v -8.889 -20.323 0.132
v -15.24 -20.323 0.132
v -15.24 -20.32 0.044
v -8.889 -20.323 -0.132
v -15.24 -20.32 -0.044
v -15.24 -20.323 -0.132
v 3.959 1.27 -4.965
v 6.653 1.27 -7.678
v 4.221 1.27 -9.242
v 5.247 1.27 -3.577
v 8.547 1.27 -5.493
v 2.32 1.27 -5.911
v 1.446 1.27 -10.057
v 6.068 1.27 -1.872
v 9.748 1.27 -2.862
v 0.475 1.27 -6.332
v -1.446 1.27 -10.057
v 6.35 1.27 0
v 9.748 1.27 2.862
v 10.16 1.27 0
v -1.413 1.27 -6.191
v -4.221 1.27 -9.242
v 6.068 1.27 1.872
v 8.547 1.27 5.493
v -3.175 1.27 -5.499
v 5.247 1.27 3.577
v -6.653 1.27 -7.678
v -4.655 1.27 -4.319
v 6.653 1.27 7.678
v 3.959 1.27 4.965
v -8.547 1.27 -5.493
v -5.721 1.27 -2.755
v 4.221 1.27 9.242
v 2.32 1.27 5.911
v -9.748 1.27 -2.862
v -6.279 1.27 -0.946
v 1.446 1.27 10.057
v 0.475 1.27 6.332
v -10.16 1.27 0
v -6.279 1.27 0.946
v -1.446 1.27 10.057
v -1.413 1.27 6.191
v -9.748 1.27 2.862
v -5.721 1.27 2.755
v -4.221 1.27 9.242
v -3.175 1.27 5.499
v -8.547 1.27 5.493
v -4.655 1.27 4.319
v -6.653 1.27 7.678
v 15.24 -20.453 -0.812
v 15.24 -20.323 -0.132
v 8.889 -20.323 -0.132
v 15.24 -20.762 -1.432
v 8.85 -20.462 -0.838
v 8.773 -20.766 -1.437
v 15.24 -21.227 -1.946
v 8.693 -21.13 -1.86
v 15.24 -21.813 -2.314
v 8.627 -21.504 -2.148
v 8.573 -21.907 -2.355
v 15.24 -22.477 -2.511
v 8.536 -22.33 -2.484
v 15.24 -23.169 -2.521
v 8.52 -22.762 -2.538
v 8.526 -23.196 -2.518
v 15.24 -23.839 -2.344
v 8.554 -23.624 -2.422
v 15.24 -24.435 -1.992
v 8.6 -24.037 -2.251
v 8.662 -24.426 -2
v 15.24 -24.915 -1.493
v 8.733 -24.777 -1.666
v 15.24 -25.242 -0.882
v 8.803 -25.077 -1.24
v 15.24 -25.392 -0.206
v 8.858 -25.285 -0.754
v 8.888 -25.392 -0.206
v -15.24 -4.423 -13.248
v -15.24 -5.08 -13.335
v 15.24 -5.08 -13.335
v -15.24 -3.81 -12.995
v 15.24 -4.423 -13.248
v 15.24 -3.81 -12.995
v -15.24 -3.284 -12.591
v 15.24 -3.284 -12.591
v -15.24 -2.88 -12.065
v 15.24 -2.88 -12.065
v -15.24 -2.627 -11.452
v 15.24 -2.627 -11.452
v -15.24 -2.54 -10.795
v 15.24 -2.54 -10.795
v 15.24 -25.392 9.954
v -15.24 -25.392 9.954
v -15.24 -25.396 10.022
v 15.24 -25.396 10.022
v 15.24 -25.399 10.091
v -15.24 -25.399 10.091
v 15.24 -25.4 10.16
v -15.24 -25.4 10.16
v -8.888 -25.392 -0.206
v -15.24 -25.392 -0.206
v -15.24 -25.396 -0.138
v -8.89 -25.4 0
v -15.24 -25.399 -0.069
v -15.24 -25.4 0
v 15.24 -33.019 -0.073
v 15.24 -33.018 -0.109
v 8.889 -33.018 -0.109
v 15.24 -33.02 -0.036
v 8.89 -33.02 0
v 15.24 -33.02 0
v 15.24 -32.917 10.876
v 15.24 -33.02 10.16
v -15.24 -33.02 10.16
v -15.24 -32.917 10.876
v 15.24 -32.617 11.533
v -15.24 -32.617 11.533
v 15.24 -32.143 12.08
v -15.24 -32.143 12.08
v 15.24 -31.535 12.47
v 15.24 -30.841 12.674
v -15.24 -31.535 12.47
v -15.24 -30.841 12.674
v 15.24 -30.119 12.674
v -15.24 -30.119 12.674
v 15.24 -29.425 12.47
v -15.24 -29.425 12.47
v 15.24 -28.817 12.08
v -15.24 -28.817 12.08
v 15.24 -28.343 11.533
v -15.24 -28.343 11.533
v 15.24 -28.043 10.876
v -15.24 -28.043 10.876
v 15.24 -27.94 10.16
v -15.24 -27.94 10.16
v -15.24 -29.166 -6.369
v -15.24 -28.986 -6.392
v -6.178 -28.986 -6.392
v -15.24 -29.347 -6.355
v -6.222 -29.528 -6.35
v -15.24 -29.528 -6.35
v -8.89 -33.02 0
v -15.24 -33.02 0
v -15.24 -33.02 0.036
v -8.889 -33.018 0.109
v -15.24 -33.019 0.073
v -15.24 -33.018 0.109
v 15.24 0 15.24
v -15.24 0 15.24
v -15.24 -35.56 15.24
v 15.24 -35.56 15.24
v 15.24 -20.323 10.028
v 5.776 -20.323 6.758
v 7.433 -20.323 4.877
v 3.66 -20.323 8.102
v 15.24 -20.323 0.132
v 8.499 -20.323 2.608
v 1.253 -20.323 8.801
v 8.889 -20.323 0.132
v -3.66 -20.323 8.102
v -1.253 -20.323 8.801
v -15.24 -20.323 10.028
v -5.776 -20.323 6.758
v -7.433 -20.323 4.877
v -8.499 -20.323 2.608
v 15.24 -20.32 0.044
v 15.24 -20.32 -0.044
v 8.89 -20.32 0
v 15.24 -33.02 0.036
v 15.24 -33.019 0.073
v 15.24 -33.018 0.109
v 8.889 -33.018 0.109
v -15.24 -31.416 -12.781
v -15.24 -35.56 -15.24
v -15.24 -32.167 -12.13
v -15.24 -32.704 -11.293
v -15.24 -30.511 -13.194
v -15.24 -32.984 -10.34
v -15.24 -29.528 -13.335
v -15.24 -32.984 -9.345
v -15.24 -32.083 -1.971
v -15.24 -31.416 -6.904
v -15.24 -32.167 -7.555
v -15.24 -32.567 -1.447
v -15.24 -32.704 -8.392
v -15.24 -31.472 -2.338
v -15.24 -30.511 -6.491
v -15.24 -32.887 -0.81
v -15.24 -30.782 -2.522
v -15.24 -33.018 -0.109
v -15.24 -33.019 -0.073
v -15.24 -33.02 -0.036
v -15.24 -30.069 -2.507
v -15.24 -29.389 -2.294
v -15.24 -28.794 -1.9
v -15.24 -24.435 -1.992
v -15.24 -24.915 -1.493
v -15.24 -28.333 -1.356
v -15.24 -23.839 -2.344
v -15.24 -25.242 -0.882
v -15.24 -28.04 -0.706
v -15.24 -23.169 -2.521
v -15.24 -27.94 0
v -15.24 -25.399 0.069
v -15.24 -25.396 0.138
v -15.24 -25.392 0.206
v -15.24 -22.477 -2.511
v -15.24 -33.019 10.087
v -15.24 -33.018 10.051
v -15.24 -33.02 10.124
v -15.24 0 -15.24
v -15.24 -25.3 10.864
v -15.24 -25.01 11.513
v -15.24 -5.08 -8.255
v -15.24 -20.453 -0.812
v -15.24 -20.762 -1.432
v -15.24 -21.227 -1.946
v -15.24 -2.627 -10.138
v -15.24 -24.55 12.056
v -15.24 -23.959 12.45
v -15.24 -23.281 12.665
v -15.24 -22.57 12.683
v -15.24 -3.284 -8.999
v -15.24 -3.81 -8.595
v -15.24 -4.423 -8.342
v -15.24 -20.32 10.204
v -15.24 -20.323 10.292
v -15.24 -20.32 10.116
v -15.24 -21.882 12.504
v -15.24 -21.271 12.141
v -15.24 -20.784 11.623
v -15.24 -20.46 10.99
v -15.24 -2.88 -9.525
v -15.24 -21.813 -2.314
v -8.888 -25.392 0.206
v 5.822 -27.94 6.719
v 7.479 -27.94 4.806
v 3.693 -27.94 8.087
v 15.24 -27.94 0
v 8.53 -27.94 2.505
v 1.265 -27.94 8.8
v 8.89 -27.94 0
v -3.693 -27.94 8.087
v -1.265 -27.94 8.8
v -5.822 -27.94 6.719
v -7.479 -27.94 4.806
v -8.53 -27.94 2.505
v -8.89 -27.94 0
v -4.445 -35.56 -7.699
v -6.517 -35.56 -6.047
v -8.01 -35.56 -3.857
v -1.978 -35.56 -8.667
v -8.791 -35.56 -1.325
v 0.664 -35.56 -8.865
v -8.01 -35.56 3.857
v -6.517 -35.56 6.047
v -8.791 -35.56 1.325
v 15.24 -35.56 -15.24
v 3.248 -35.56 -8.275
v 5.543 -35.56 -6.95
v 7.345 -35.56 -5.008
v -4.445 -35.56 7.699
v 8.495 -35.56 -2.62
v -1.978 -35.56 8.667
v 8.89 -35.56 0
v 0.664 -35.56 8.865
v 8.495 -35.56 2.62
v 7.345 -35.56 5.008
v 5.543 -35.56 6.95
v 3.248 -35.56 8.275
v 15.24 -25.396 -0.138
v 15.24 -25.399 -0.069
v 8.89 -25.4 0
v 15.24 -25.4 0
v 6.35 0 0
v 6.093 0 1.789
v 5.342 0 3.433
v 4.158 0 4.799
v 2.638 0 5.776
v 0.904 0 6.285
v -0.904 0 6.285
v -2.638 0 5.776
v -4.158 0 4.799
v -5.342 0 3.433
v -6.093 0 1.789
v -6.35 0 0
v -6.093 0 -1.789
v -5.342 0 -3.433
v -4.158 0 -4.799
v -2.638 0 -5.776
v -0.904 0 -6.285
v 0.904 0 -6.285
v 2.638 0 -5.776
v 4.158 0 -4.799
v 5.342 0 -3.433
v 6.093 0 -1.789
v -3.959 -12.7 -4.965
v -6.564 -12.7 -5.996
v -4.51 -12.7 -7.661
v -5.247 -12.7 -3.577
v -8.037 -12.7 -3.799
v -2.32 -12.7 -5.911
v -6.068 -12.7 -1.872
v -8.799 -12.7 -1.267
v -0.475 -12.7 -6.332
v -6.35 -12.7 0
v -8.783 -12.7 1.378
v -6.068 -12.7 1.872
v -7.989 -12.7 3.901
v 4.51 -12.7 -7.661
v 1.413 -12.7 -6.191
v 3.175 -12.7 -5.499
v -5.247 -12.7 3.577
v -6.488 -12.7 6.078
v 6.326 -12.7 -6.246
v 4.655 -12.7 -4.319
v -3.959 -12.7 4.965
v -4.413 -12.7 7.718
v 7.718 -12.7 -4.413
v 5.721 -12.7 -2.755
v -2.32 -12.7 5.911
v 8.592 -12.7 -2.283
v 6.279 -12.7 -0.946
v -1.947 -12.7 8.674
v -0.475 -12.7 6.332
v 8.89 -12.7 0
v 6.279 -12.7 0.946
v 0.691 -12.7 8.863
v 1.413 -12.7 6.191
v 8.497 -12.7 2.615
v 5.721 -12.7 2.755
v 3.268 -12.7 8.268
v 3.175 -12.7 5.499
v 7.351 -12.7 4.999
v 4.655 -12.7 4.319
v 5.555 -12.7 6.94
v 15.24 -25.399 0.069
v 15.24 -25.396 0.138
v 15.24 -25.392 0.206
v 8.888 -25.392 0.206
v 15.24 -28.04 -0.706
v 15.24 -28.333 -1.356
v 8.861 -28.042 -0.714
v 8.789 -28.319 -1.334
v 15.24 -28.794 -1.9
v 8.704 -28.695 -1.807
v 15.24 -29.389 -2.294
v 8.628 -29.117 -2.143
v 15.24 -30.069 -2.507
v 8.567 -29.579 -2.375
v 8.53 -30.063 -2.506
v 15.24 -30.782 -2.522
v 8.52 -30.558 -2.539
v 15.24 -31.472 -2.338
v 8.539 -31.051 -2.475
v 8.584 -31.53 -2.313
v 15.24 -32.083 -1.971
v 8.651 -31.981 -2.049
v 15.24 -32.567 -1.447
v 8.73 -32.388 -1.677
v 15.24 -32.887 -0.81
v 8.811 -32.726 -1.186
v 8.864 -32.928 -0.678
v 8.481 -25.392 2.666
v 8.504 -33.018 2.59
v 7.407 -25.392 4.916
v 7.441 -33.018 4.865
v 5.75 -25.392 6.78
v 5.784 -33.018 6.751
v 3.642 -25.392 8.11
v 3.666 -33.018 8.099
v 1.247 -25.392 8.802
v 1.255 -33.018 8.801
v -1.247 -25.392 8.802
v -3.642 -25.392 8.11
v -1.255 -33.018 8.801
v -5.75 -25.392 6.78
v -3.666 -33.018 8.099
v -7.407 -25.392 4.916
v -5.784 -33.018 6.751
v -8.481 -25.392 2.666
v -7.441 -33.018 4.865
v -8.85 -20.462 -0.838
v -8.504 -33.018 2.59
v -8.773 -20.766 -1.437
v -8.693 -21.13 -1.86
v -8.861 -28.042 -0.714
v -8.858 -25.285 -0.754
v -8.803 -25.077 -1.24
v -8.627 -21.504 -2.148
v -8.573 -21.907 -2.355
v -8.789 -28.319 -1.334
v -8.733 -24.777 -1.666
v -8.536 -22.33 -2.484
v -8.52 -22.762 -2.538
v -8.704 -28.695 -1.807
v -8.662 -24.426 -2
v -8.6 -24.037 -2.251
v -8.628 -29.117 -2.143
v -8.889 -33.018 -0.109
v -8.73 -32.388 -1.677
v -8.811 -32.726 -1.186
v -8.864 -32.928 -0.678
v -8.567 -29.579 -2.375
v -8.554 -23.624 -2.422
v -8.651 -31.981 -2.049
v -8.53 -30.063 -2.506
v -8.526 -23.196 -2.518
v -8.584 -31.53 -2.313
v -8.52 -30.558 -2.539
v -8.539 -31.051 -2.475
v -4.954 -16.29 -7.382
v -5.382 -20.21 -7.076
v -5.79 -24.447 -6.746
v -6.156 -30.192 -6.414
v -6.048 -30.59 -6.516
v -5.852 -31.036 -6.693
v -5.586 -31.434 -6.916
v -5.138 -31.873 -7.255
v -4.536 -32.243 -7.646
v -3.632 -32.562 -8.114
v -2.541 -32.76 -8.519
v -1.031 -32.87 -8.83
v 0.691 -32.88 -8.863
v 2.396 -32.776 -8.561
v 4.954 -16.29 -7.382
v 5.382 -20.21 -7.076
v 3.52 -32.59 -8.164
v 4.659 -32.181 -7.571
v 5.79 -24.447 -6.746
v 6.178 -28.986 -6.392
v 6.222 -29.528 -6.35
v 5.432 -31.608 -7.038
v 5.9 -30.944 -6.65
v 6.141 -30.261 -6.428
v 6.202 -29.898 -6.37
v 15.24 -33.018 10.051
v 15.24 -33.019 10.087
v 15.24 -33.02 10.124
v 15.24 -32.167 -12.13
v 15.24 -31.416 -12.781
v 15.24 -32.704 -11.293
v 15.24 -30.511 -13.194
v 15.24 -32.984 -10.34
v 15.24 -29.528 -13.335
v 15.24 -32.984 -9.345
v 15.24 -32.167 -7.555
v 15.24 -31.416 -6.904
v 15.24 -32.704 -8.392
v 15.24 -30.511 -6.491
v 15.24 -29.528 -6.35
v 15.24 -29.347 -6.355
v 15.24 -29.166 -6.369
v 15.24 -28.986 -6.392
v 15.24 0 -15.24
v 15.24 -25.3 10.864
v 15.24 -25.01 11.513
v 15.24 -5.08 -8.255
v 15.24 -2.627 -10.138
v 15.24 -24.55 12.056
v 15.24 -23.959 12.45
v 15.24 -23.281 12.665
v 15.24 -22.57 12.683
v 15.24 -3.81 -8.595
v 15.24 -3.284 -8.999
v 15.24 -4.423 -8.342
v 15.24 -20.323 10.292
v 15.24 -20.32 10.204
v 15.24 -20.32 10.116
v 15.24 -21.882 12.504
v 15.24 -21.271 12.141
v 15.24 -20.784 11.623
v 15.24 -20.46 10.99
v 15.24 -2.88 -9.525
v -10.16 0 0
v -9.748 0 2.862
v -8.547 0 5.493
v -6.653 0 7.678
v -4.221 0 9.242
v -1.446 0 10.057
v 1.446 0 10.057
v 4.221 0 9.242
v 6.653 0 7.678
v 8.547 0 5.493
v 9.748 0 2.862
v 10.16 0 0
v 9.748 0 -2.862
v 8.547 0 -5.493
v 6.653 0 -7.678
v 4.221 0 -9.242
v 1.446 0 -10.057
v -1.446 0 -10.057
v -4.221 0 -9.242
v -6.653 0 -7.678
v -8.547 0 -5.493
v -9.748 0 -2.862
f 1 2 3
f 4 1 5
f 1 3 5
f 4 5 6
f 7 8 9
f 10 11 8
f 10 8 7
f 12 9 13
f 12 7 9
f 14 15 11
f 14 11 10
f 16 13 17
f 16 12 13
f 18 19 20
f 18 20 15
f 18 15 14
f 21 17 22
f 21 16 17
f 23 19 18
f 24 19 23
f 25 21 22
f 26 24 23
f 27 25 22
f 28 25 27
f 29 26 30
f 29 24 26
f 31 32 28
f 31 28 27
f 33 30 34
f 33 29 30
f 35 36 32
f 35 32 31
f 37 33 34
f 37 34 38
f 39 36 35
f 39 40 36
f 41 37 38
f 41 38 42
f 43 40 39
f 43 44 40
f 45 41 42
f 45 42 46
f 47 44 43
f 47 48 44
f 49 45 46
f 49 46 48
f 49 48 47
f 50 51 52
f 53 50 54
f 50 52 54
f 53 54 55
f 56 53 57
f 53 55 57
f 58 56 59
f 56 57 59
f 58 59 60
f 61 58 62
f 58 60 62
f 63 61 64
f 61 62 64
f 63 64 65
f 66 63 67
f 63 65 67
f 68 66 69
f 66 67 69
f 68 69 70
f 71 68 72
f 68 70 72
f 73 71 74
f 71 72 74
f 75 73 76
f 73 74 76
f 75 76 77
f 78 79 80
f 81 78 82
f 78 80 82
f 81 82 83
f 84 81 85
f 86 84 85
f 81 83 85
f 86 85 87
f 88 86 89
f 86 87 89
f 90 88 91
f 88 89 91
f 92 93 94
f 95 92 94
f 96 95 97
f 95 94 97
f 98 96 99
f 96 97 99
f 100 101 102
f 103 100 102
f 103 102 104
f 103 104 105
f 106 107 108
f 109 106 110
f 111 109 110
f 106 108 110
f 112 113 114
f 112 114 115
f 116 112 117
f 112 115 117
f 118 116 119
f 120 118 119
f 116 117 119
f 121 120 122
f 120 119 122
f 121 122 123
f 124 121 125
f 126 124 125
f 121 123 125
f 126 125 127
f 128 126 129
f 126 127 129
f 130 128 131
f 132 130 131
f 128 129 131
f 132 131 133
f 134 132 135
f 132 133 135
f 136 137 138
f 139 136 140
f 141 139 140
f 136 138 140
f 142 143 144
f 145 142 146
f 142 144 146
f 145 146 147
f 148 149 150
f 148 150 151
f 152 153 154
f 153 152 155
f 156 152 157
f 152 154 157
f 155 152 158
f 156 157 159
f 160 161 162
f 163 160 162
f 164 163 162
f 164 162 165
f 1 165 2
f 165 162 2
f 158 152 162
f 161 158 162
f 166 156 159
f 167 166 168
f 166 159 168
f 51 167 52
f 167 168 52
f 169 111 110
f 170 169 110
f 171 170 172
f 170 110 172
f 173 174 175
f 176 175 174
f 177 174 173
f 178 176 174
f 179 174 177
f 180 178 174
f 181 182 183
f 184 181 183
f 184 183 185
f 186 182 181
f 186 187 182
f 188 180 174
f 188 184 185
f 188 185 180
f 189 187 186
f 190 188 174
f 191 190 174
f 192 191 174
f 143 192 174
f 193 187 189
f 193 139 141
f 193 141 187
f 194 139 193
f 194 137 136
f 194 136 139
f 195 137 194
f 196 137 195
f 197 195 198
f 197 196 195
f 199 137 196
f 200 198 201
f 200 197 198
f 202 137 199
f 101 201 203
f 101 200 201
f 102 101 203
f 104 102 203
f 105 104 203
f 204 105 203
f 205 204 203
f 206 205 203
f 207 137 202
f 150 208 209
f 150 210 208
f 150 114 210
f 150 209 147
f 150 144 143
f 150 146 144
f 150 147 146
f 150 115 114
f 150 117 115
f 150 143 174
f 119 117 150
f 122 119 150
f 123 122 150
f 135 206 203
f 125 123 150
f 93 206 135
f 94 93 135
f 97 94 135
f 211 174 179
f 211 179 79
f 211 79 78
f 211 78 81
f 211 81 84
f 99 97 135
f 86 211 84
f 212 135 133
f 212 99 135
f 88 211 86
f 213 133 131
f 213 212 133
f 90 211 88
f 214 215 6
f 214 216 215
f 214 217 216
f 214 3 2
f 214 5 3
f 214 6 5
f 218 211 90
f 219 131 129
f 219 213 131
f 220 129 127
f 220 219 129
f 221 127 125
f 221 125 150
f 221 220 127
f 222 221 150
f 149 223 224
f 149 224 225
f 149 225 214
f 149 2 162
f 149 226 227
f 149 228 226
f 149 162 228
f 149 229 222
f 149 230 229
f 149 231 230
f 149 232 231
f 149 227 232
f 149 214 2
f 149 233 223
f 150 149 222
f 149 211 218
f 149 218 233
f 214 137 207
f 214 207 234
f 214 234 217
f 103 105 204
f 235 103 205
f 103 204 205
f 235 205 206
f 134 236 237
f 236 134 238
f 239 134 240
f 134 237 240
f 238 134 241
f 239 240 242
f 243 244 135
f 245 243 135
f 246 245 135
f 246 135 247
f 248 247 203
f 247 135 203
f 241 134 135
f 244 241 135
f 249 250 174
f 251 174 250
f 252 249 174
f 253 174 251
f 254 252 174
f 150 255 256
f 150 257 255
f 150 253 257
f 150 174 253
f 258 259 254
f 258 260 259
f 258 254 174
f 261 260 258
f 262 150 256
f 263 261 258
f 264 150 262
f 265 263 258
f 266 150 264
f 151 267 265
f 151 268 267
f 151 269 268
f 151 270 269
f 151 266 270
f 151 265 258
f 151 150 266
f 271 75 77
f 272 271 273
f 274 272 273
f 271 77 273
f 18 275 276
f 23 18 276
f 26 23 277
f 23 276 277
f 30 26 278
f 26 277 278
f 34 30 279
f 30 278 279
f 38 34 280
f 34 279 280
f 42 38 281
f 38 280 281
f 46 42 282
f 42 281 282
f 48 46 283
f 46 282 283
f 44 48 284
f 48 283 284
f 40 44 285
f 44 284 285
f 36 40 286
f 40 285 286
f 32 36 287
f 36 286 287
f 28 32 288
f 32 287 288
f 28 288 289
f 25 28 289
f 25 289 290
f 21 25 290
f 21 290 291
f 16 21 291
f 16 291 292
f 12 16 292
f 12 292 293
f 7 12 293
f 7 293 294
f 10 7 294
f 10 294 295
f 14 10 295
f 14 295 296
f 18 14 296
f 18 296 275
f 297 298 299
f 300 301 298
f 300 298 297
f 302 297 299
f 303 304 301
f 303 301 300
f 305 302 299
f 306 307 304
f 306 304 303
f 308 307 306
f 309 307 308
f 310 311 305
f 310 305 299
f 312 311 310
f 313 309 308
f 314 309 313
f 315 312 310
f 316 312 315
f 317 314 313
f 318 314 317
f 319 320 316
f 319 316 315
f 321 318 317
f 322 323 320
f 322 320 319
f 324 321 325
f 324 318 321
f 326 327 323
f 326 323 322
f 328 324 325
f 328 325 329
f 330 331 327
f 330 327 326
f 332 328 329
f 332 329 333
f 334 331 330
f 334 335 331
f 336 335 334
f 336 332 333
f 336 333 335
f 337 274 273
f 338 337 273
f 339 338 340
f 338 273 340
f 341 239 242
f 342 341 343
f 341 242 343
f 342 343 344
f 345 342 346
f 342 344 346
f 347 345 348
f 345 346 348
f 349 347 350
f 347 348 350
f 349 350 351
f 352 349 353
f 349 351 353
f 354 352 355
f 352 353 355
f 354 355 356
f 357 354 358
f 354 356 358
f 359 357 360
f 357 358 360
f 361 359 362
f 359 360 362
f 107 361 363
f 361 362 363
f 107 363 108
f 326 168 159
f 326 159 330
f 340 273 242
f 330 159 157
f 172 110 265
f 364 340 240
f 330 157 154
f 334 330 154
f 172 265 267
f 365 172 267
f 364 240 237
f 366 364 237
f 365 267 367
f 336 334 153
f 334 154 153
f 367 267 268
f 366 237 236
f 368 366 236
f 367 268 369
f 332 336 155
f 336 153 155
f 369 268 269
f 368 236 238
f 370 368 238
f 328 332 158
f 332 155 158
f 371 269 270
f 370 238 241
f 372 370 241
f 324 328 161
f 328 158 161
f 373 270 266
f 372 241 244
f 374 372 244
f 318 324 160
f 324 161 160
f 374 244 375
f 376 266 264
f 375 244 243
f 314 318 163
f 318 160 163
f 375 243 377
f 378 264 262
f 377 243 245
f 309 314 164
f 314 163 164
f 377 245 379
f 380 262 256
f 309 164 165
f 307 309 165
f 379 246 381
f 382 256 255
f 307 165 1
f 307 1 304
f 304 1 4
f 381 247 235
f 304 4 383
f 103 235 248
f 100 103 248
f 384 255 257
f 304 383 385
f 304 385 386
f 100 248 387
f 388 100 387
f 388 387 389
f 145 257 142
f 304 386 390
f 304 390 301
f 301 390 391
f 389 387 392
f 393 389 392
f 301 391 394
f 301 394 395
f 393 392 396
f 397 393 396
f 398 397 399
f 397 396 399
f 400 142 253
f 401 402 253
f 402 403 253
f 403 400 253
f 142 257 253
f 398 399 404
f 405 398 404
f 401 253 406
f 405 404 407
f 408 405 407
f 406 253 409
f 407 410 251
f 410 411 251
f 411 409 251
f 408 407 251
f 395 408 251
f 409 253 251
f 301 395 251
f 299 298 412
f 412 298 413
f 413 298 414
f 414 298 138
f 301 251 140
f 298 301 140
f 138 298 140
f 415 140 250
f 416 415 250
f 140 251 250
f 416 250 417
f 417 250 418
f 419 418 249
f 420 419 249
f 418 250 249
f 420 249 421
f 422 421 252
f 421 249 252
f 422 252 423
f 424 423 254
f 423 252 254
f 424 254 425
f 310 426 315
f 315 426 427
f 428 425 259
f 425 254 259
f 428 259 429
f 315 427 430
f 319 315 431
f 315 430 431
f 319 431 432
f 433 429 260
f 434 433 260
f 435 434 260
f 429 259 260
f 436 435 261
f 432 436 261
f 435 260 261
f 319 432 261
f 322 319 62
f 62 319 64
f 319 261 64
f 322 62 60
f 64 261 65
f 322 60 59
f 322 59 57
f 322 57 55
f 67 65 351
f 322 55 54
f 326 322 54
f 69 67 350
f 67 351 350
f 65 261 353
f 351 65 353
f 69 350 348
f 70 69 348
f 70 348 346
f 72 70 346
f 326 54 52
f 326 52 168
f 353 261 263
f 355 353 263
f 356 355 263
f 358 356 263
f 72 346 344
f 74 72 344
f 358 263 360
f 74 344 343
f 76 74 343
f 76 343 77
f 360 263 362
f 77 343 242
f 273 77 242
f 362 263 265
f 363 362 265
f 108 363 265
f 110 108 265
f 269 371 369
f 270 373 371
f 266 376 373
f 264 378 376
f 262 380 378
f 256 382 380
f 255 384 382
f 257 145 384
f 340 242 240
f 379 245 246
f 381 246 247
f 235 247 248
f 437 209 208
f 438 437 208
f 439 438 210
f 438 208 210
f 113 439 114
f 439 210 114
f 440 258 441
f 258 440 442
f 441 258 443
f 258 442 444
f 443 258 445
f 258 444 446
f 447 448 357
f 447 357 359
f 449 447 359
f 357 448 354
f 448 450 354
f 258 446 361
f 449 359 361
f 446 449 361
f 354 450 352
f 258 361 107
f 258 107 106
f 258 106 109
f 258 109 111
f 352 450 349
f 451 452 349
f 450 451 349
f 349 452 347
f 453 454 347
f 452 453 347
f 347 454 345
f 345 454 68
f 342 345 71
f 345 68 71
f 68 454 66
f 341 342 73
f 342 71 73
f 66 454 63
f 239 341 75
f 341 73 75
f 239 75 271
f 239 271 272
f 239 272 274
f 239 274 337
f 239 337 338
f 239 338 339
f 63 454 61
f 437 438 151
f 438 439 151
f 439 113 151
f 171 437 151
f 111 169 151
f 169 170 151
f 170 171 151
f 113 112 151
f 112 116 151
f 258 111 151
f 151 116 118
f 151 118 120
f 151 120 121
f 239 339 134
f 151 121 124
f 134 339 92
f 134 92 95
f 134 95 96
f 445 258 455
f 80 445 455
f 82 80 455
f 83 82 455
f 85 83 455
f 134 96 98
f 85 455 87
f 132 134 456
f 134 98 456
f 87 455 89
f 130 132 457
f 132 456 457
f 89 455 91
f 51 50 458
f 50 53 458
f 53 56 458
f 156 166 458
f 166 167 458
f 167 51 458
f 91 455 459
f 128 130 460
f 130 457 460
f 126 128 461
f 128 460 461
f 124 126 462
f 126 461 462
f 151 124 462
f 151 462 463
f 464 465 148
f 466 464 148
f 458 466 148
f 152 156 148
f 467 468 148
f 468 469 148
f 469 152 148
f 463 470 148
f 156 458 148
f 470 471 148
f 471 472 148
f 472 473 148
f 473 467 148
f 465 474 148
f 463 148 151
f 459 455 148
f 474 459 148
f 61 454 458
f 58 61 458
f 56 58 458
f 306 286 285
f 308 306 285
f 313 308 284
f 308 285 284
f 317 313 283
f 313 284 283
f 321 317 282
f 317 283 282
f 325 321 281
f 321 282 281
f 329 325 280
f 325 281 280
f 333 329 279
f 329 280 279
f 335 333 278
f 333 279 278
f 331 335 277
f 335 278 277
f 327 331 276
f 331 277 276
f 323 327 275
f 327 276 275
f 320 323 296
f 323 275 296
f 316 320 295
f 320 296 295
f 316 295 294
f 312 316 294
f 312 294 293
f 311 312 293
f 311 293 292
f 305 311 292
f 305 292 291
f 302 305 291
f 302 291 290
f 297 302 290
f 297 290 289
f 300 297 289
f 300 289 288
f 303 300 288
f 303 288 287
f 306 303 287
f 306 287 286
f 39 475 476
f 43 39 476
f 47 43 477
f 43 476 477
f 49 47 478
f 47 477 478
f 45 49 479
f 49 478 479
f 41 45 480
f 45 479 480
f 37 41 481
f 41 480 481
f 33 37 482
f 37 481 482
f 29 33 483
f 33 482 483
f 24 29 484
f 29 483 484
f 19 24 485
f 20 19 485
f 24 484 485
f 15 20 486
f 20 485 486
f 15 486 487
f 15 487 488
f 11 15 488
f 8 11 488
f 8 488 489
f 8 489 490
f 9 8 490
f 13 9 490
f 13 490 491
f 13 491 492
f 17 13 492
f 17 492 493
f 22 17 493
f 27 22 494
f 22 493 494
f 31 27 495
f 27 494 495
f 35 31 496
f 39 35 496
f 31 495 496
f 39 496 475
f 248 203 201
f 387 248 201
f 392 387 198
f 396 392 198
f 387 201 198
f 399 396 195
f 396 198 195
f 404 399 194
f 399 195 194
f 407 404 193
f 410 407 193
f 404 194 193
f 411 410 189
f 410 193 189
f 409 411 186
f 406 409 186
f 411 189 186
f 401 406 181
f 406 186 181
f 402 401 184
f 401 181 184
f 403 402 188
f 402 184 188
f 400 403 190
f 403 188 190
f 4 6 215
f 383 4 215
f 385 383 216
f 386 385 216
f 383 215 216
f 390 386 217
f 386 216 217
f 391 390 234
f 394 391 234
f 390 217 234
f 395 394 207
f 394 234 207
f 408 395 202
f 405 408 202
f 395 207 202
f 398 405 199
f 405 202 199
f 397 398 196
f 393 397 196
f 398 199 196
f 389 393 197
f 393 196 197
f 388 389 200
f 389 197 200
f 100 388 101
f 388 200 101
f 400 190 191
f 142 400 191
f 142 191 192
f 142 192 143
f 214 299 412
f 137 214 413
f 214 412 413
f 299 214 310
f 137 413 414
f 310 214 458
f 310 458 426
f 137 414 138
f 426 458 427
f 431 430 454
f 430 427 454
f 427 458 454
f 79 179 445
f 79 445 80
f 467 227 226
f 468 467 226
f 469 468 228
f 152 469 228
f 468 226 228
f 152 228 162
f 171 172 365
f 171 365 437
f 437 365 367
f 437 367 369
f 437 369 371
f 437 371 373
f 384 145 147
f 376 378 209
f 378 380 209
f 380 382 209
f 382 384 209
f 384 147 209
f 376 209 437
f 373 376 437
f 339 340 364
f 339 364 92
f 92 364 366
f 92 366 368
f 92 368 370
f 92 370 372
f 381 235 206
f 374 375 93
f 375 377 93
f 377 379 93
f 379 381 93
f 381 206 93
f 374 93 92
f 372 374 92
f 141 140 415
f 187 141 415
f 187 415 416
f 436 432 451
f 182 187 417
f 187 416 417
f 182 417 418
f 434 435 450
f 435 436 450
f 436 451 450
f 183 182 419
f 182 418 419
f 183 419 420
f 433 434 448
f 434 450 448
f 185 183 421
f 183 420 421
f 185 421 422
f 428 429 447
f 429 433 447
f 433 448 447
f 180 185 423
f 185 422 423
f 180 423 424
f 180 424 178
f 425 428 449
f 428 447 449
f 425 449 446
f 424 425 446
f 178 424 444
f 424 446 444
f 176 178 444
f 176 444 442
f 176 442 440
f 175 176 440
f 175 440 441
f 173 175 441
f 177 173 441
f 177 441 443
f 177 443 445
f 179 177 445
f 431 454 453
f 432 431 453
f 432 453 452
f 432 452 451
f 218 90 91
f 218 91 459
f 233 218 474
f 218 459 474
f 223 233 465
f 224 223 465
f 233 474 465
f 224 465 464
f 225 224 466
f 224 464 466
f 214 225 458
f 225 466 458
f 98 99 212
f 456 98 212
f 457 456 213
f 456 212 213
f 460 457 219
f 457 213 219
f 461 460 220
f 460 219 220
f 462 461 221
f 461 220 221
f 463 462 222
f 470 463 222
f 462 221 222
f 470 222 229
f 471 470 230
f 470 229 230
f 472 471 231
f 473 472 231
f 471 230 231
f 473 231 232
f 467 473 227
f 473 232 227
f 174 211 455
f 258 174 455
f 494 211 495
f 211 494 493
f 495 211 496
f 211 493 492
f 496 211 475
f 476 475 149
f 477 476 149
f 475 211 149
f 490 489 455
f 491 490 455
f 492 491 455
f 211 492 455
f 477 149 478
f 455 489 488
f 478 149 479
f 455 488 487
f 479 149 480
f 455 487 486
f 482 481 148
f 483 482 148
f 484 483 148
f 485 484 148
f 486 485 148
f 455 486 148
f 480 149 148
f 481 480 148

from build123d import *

# Parameters (mm, degrees)
F0_W      = 30.48
F0_H      = 30.48
F1_DEPTH  = 35.56
F3_DEPTH  = 38.1
F5_DEPTH  = 38.1
F6_R      = 8.89
F7_DEPTH  = 22.86
F8_R      = 10.16
F9_DEPTH  = 1.27
F10_R     = 6.35
F11_DEPTH = 38.1
F12_R     = 6.35
F13_DEPTH = 25.4


with BuildPart() as f1:
    # F0 (on Front) → F1 (new body)
    with BuildSketch(Plane.XZ):
        Rectangle(F0_W, F0_H)
    extrude(amount=F1_DEPTH)

    # F2 (on face) → F3 (cut)
    with BuildSketch(Plane(origin=(-15.24, 0, 0), x_dir=(0, -1, 0), z_dir=(-1, 0, 0))):
        with BuildLine():
            ThreePointArc((33.017656, 10.050903), (33.019414, 10.105439), (33.02, 10.16))
            ThreePointArc((33.02, 10.16), (30.48, 12.7), (27.94, 10.16))
            ThreePointArc((27.94, 10.16), (30.425439, 7.620586), (33.017656, 10.050903))
        make_face()
        with BuildLine():
            ThreePointArc((33.017656, 10.050903), (30.425439, 7.620586), (27.94, 10.16))
            Line((27.94, 10.16), (27.94, 0))
            ThreePointArc((27.94, 0), (30.425439, 2.539414), (33.017656, 0.109097))
            Line((33.017656, 0.109097), (33.017656, 10.050903))
        make_face()
        with BuildLine():
            ThreePointArc((33.017656, 0.109097), (30.425439, 2.539414), (27.94, 0))
            ThreePointArc((27.94, 0), (30.425439, -2.539414), (33.017656, -0.109097))
            Line((33.017656, -0.109097), (33.017656, 0.109097))
        make_face()
        with BuildLine():
            ThreePointArc((33.02, 0), (33.019414, 0.054561), (33.017656, 0.109097))
            Line((33.017656, 0.109097), (33.017656, -0.109097))
            ThreePointArc((33.017656, -0.109097), (33.019414, -0.054561), (33.02, 0))
        make_face()
        with BuildLine():
            ThreePointArc((25.391599, 9.953588), (25.397899, 10.056709), (25.4, 10.16))
            ThreePointArc((25.4, 10.16), (22.926198, 12.699137), (20.323451, 10.292352))
            Line((20.323451, 10.292352), (20.323451, 10.027648))
            ThreePointArc((20.323451, 10.027648), (22.822887, 7.620271), (25.391599, 9.953588))
        make_face()
        with BuildLine():
            Line((20.323451, 10.027648), (20.323451, 10.292352))
            ThreePointArc((20.323451, 10.292352), (20.32, 10.16), (20.323451, 10.027648))
        make_face()
        with BuildLine():
            Line((25.391599, 0.206412), (25.391599, 9.953588))
            ThreePointArc((25.391599, 9.953588), (22.822887, 7.620271), (20.323451, 10.027648))
            Line((20.323451, 10.027648), (20.323451, 0.132352))
            ThreePointArc((20.323451, 0.132352), (22.822887, 2.539729), (25.391599, 0.206412))
        make_face()
        with BuildLine():
            Line((25.391599, -0.206412), (25.391599, 0.206412))
            ThreePointArc((25.391599, 0.206412), (22.822887, 2.539729), (20.323451, 0.132352))
            Line((20.323451, 0.132352), (20.323451, -0.132352))
            ThreePointArc((20.323451, -0.132352), (22.822887, -2.539729), (25.391599, -0.206412))
        make_face()
        with BuildLine():
            ThreePointArc((25.4, 0), (25.397899, 0.103291), (25.391599, 0.206412))
            Line((25.391599, 0.206412), (25.391599, -0.206412))
            ThreePointArc((25.391599, -0.206412), (25.397899, -0.103291), (25.4, 0))
        make_face()
        with BuildLine():
            Line((20.323451, -0.132352), (20.323451, 0.132352))
            ThreePointArc((20.323451, 0.132352), (20.32, 0), (20.323451, -0.132352))
        make_face()
    extrude(amount=-F3_DEPTH, mode=Mode.SUBTRACT)

    # F4 (on face) → F5 (cut)
    with BuildSketch(Plane.YZ.offset(15.24)):
        with BuildLine():
            Line((-28.986499, -6.392156), (-29.5275, -6.35))
            ThreePointArc((-29.5275, -6.35), (-33.02, -9.8425), (-29.5275, -13.335))
            ThreePointArc((-29.5275, -13.335), (-27.05793, -12.31207), (-26.035, -9.8425))
            ThreePointArc((-26.035, -9.8425), (-26.873541, -7.572246), (-28.986499, -6.392156))
        make_face()
        with BuildLine():
            ThreePointArc((-28.986499, -6.392156), (-29.25618, -6.360555), (-29.5275, -6.35))
            Line((-29.5275, -6.35), (-28.986499, -6.392156))
        make_face()
        with BuildLine():
            ThreePointArc((-26.035, -9.8425), (-27.05793, -12.31207), (-29.5275, -13.335))
            Line((-29.5275, -13.335), (-5.08, -13.335))
            ThreePointArc((-5.08, -13.335), (-7.62, -10.795), (-5.08, -8.255))
            Line((-5.08, -8.255), (-28.986499, -6.392156))
            ThreePointArc((-28.986499, -6.392156), (-26.873541, -7.572246), (-26.035, -9.8425))
        make_face()
        with BuildLine():
            ThreePointArc((-5.08, -8.255), (-7.62, -10.795), (-5.08, -13.335))
            ThreePointArc((-5.08, -13.335), (-3.283949, -12.591051), (-2.54, -10.795))
            ThreePointArc((-2.54, -10.795), (-3.283949, -8.998949), (-5.08, -8.255))
        make_face()
    extrude(amount=-F5_DEPTH, mode=Mode.SUBTRACT)

    # F6 (on face) → F7 (cut)
    with BuildSketch(Plane.XZ.offset(35.56)):
        Circle(F6_R)
    extrude(amount=-F7_DEPTH, mode=Mode.SUBTRACT)

    # F8 (on face) → F9 (join)
    with BuildSketch(Plane(origin=(0, 0, 0), x_dir=(-1, 0, 0), z_dir=(0, 1, 0))):
        Circle(F8_R)
    extrude(amount=F9_DEPTH)

    # F10 (on face) → F11 (cut)
    with BuildSketch(Plane.XZ):
        Circle(F10_R)
    extrude(amount=-F11_DEPTH, mode=Mode.SUBTRACT)

    # F12 (on face) → F13 (cut)
    with BuildSketch(Plane(origin=(0, 0, 0), x_dir=(-1, 0, 0), z_dir=(0, 1, 0))):
        Circle(F12_R)
    extrude(amount=-F13_DEPTH, mode=Mode.SUBTRACT)


solid = f1.part
